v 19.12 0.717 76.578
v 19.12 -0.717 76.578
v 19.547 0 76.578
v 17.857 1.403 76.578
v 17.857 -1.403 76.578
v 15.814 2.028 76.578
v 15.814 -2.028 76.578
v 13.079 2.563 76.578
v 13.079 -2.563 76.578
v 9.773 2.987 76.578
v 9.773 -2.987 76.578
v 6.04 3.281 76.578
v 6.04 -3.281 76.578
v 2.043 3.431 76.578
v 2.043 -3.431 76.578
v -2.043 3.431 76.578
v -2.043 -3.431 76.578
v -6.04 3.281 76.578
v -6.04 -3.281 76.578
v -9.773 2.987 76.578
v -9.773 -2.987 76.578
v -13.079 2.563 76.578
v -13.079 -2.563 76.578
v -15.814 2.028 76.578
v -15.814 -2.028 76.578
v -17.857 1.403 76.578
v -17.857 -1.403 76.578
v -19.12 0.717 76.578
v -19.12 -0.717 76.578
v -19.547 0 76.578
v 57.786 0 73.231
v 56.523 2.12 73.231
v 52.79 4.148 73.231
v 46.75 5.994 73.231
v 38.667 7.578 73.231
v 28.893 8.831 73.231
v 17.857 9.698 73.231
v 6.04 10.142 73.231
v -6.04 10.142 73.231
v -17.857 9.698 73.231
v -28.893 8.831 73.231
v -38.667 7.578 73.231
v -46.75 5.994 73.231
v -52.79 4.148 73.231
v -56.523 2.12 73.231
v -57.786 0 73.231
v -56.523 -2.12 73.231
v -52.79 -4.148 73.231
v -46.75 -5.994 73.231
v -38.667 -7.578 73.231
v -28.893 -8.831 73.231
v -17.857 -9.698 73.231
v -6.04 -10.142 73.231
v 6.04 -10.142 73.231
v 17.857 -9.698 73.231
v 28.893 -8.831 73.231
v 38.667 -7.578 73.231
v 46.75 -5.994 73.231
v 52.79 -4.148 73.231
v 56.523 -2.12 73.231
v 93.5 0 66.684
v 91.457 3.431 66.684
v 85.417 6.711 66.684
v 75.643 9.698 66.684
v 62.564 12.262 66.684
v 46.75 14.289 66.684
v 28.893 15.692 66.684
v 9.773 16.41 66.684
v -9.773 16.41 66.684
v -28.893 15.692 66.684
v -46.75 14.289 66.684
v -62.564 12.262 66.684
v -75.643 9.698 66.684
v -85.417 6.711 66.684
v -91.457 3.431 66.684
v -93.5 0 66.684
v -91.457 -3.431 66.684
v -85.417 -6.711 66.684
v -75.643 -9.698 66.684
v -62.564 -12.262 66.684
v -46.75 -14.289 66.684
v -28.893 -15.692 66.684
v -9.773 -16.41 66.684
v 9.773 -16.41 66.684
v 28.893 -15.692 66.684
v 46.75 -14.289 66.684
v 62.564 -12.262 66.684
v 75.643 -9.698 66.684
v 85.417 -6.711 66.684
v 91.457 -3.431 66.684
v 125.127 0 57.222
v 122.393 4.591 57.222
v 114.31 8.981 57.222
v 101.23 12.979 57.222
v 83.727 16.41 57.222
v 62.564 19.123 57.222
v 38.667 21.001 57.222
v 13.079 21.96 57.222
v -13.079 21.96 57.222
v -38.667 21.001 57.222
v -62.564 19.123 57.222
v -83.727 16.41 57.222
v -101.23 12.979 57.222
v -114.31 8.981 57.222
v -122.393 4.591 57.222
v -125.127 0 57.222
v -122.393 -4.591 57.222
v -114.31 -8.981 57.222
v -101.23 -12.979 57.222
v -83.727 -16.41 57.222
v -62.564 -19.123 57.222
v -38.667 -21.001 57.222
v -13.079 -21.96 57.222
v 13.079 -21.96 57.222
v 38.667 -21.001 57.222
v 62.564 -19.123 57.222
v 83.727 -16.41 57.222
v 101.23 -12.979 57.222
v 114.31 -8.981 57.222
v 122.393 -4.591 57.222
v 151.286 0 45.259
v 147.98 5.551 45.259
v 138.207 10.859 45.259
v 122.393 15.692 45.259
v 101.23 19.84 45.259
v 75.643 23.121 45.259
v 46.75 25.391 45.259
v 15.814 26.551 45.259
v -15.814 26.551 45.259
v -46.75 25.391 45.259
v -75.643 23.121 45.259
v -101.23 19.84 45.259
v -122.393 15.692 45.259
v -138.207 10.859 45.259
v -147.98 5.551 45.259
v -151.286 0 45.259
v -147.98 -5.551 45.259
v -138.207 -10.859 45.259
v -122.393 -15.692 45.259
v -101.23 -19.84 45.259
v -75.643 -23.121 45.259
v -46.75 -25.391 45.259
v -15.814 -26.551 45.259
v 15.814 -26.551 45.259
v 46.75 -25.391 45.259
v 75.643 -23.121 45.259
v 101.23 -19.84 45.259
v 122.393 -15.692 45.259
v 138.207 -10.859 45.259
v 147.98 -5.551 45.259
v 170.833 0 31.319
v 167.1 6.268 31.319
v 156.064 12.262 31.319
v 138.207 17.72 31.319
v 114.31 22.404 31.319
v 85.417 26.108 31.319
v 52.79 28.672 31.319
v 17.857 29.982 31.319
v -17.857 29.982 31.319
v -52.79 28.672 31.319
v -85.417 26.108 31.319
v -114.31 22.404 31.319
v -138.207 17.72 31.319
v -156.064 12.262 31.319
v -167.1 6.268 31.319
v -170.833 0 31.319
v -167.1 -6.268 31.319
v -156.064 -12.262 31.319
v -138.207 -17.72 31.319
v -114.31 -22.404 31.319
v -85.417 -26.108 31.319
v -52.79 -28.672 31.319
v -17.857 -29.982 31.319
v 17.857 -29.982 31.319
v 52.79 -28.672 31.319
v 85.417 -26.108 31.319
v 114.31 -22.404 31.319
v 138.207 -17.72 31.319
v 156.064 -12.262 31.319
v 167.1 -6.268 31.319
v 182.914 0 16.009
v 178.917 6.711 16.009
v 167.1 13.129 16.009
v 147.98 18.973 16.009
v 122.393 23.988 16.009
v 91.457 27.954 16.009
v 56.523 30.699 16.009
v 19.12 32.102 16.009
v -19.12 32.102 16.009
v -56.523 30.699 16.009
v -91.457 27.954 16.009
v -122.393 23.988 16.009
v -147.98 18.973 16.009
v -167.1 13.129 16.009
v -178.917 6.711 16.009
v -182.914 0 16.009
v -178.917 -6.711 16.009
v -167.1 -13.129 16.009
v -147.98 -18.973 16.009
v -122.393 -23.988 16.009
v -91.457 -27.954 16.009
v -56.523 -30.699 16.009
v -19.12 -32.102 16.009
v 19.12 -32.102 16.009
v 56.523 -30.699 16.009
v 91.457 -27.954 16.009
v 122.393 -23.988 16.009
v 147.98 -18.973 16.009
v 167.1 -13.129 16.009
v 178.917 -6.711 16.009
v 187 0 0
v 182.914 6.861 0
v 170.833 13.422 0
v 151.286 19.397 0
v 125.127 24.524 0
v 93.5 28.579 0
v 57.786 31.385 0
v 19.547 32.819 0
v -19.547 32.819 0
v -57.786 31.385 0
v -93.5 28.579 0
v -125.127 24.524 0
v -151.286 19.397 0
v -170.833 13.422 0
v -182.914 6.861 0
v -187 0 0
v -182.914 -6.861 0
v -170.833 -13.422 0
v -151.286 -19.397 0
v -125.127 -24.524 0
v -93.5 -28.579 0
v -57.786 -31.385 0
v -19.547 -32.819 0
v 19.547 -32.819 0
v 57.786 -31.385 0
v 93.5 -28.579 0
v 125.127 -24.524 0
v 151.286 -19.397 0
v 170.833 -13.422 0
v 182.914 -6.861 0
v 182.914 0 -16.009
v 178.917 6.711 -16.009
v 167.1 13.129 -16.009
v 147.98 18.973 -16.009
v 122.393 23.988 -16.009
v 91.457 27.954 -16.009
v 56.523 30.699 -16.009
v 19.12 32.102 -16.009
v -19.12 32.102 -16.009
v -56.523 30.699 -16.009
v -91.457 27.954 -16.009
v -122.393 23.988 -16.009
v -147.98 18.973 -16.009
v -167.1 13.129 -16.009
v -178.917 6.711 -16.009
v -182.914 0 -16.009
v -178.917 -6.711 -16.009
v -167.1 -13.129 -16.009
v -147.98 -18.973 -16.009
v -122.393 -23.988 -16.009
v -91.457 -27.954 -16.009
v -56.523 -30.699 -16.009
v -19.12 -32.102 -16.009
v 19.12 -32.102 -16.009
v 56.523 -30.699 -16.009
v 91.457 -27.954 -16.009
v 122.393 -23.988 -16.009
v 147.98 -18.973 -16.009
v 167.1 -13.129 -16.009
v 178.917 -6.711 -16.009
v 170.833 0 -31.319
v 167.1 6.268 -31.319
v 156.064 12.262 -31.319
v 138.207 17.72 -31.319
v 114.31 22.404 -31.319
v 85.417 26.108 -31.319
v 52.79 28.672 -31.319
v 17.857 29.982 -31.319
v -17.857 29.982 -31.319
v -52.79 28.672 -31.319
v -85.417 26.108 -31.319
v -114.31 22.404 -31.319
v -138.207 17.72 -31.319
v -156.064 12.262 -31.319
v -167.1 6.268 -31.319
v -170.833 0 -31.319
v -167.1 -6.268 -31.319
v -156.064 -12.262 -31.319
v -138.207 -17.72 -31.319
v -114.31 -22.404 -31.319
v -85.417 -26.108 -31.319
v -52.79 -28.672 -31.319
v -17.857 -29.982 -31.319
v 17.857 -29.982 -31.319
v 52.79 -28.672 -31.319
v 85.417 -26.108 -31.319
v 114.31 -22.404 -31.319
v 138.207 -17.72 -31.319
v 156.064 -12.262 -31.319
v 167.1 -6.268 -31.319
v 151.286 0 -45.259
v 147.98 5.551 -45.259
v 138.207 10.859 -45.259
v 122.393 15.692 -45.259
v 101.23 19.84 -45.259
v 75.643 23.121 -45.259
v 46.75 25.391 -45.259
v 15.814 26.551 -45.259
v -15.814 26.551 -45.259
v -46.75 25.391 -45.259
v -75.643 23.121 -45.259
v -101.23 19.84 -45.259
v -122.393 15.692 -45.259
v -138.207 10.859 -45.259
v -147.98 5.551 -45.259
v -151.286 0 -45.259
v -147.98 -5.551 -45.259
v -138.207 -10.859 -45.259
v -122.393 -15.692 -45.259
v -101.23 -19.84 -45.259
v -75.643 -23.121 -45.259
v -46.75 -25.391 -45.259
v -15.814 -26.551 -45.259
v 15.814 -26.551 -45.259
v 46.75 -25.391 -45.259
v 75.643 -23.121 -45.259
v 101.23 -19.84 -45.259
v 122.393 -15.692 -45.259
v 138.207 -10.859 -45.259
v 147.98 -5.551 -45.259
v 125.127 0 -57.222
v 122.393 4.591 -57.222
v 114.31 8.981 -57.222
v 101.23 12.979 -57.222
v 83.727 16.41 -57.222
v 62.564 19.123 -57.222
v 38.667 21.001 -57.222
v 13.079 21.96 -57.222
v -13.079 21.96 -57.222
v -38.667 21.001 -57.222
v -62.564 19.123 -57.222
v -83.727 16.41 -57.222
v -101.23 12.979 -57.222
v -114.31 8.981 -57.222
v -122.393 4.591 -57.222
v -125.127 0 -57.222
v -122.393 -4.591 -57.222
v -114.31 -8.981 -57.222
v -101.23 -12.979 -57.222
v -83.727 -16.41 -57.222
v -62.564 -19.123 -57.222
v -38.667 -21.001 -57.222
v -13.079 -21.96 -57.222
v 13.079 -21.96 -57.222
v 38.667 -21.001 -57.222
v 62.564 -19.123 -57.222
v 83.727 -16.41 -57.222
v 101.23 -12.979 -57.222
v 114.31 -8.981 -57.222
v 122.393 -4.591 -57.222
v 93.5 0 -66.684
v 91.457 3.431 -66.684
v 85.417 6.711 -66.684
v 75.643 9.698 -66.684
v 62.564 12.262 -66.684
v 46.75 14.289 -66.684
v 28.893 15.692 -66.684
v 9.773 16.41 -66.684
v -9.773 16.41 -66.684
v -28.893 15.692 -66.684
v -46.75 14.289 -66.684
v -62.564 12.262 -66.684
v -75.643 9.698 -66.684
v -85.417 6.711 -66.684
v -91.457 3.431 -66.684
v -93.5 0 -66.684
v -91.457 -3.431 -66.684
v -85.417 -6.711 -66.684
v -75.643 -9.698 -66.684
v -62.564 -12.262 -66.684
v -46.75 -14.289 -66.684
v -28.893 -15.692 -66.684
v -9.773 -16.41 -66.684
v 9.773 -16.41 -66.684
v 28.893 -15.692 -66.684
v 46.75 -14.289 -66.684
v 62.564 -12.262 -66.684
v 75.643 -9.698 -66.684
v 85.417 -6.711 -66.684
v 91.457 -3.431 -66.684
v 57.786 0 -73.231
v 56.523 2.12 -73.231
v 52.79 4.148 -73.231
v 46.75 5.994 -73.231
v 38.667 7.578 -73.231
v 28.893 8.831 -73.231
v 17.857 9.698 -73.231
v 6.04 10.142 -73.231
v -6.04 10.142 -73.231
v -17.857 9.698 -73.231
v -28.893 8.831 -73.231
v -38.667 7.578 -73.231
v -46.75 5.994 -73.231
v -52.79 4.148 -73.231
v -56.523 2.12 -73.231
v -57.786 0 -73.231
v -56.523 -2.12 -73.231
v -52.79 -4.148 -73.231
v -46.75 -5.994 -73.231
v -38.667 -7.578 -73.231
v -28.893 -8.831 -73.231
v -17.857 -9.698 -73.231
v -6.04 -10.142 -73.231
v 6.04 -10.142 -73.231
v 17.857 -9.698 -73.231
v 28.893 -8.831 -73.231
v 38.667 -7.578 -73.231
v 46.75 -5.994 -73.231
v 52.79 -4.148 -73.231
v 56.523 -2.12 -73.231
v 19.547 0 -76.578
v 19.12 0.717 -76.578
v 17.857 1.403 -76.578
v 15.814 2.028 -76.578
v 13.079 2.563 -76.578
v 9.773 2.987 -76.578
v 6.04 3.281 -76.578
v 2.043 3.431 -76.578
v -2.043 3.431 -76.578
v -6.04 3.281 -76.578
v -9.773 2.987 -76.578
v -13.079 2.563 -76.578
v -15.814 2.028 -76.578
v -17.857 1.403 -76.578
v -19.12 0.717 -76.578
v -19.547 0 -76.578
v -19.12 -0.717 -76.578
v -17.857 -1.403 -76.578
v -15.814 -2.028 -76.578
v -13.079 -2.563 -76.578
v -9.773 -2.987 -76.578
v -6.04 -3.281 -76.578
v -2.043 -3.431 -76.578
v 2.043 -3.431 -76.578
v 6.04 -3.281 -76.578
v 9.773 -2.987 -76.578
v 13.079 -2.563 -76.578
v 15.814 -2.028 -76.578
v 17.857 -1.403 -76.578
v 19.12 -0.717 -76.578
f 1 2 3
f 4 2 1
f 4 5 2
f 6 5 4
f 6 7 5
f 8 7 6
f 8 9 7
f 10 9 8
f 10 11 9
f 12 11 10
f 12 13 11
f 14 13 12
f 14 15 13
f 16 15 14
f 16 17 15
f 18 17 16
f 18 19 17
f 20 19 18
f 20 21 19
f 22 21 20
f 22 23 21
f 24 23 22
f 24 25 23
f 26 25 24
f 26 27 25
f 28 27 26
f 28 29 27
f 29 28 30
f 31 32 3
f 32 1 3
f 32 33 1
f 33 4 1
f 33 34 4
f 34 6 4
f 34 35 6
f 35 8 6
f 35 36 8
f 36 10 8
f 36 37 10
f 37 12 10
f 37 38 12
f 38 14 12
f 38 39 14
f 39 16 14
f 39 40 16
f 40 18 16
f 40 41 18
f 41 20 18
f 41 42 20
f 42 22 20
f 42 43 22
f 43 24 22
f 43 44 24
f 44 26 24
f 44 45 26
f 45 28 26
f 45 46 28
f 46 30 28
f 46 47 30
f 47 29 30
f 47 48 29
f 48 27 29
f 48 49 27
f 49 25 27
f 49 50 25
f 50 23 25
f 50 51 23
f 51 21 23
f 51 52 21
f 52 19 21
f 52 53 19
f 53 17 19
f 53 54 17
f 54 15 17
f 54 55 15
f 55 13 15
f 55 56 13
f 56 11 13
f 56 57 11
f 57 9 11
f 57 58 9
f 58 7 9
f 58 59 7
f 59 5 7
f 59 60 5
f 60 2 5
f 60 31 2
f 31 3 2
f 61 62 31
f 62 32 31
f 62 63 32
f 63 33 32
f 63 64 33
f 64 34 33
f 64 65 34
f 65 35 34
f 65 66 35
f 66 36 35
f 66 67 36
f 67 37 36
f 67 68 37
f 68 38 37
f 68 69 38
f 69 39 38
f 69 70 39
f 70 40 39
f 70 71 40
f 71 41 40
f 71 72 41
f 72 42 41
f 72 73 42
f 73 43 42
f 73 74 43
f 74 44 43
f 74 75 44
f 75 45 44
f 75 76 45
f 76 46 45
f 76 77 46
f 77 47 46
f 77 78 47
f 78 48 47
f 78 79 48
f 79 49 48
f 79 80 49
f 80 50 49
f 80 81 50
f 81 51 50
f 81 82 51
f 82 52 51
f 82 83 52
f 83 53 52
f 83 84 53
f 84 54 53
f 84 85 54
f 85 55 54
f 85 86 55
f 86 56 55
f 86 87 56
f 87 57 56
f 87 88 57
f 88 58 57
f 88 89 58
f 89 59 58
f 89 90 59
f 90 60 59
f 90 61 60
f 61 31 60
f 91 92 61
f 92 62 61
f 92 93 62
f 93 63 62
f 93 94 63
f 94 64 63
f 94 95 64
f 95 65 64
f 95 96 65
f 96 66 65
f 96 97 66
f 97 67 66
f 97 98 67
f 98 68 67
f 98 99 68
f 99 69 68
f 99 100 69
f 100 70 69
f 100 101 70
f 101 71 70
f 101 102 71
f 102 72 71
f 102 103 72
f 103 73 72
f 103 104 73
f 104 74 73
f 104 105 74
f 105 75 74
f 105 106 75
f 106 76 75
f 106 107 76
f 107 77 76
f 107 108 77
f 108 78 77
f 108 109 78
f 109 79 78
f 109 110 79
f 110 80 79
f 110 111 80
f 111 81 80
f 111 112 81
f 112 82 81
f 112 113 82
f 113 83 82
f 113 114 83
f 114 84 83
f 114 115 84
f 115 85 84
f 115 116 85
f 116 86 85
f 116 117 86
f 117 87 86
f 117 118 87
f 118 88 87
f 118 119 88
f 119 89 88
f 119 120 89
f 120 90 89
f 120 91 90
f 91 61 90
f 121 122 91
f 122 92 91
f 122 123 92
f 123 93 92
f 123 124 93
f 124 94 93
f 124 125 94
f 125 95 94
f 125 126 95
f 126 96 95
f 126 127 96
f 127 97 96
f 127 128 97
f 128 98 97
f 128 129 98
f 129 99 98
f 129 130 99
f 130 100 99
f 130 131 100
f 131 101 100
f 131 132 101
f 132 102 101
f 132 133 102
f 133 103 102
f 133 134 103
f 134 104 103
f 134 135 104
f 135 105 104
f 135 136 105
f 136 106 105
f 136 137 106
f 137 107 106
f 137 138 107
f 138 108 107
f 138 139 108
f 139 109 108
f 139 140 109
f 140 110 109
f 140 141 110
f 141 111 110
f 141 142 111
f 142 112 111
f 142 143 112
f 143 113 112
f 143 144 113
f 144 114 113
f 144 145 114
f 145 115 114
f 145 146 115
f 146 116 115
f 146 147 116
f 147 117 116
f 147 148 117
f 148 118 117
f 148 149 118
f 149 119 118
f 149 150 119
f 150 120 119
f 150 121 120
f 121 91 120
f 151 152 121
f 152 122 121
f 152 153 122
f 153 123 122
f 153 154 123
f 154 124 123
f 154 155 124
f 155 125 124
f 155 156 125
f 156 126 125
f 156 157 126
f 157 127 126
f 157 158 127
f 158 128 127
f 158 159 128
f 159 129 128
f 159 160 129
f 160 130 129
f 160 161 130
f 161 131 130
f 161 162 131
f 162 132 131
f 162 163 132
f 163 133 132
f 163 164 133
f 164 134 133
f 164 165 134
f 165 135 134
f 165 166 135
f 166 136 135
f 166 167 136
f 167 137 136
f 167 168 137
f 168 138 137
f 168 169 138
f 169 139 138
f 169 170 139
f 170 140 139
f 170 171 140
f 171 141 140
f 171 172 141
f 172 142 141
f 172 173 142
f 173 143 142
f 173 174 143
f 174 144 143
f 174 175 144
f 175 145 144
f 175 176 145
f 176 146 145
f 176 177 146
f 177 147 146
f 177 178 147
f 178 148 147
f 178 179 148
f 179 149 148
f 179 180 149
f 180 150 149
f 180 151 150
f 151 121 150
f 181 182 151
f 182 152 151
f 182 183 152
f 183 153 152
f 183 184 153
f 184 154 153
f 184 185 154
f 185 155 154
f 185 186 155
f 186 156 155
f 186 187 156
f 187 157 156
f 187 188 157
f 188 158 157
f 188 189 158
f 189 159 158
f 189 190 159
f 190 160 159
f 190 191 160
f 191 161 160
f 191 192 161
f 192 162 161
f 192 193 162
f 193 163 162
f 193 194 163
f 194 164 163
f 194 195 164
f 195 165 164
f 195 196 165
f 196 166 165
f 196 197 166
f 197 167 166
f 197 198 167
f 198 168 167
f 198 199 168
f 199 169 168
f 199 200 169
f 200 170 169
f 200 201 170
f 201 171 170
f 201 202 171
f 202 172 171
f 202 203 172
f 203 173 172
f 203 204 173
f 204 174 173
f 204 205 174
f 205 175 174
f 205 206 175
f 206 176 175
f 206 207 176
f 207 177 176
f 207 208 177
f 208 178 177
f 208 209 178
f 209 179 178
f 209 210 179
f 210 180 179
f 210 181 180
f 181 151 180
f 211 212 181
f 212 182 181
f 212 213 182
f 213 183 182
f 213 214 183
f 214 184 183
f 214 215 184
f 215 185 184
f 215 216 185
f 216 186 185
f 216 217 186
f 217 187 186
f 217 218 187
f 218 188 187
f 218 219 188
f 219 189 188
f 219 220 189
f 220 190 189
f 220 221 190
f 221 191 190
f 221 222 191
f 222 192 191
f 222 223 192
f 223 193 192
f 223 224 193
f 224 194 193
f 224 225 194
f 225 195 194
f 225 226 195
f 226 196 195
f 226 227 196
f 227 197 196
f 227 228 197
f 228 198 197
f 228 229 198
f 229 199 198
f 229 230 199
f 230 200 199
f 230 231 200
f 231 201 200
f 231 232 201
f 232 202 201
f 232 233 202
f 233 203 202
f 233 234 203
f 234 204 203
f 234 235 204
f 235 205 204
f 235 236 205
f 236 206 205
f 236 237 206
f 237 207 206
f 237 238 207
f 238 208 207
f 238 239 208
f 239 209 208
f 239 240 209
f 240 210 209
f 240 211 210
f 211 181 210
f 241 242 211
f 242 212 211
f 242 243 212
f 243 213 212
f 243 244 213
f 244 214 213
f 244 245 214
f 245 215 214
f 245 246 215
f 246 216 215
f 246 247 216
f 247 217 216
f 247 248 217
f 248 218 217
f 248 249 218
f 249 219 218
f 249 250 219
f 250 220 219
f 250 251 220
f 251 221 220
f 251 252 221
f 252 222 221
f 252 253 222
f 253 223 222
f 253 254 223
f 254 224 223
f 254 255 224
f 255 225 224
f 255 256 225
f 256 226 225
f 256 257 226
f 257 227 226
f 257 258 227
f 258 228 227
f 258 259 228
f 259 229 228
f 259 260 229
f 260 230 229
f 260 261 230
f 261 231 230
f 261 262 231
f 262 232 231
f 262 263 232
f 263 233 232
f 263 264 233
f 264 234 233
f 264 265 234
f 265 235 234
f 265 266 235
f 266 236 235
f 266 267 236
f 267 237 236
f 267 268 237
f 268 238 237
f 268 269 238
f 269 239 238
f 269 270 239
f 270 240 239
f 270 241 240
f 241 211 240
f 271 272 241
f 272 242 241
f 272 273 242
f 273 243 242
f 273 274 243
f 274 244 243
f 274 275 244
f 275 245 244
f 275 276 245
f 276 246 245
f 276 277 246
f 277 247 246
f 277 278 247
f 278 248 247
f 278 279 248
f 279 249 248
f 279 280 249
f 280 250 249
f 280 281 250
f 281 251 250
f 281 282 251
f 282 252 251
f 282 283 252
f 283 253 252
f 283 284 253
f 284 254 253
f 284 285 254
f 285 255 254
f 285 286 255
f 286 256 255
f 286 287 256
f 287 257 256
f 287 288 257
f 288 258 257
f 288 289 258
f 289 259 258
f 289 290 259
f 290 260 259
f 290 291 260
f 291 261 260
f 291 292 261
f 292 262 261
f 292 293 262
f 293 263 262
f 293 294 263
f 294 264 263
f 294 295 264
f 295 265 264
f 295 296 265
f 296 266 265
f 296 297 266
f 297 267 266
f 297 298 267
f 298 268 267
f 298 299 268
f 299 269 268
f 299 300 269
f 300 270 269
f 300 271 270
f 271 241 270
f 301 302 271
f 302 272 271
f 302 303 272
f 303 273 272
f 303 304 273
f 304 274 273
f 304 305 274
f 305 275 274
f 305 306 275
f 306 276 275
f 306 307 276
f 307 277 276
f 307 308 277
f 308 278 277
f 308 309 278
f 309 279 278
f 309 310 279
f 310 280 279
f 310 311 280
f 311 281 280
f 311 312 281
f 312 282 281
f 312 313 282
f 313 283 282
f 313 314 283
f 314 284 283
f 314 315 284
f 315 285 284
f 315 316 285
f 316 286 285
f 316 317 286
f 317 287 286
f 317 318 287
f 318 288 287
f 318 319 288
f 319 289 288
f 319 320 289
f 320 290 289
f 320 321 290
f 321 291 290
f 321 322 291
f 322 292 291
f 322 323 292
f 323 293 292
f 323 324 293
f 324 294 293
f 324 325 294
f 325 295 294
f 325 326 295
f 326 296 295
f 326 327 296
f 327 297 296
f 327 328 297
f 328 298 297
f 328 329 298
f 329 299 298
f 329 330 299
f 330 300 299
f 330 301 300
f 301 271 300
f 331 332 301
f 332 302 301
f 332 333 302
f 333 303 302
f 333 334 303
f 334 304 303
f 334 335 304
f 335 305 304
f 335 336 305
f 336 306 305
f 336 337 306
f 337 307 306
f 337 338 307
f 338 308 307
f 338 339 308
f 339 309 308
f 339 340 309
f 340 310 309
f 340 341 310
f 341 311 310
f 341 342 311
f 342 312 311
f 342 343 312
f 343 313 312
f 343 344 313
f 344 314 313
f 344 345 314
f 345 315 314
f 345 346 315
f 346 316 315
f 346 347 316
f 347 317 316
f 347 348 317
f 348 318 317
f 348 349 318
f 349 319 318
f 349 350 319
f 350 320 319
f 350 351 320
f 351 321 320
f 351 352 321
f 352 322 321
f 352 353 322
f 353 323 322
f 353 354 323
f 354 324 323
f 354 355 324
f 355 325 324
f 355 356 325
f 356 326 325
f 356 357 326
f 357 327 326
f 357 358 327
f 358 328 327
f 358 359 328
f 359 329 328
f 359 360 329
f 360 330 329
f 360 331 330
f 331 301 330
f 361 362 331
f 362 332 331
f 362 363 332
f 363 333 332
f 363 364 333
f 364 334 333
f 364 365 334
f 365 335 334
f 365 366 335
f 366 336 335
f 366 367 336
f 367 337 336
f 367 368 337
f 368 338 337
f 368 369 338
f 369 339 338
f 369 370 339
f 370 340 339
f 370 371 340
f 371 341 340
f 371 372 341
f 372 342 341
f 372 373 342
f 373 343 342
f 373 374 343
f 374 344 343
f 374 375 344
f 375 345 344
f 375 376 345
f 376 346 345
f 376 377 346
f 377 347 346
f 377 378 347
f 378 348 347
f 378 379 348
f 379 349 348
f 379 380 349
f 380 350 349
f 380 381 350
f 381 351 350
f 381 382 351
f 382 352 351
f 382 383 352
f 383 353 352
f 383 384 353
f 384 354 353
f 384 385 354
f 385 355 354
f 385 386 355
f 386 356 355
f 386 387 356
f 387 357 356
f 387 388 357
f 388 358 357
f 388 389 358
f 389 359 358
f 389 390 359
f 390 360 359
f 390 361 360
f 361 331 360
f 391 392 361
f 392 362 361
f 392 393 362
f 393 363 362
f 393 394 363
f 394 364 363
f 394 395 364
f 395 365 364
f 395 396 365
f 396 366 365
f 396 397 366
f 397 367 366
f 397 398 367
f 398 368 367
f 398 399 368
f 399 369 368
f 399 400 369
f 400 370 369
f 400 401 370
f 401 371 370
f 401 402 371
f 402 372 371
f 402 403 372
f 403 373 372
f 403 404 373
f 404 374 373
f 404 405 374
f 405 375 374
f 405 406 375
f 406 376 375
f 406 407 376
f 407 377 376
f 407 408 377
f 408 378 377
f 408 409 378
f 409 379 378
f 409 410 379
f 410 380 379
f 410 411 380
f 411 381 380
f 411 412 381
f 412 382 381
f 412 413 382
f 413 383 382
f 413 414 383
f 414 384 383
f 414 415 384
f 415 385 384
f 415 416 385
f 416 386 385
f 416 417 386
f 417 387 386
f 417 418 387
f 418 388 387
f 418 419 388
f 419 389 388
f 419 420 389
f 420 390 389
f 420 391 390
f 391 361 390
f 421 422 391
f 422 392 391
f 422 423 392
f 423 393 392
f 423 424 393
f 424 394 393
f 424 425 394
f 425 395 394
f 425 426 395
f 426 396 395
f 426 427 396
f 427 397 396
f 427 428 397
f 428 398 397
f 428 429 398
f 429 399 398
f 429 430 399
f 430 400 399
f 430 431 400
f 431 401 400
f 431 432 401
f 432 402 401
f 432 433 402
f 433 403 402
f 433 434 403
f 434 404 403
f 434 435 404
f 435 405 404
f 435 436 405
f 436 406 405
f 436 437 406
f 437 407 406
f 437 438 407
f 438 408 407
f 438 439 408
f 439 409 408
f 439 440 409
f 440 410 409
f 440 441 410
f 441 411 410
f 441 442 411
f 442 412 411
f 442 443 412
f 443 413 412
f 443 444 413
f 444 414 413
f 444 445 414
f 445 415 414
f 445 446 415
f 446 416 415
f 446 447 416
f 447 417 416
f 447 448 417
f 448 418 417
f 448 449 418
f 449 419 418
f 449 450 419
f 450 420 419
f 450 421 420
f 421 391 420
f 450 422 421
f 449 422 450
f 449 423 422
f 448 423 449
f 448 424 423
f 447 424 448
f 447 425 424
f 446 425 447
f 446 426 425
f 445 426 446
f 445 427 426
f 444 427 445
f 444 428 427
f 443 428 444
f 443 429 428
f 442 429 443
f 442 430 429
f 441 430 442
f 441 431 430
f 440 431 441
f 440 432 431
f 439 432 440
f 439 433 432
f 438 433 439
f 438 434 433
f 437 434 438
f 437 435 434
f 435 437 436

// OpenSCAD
// Generated by SolidPython 1.0.1 on 2020-07-29 00:46:52


scale(v = [17, 3, 7]) {
	sphere(r = 11);
}
/***********************************************
*********      SolidPython code:      **********
************************************************
 
# import packages: SolidPython
from solid import *
from solid.utils import *
from itertools import chain, combinations, permutations


class Resize:

    def __init__(self, scad_file):
        self.scad_file = scad_file
        #self.scad_file = import_scad(scad_file)
        # cone/cylinder param:
        self.r1 = 0
        self.r2 = 0
        self.h = 0
        # rectangular prism param:
        self.w = 0
        self.l = 0
        # ellipse param:
        self.r = 0

    # import OpenScad code (file name corresponds to shape)


    # classify shape + parameters
    def assign(self, param1, param2, param3):
        if self.scad_file == 'cone.scad':
            self.r1 = param1
            self.r2 = param2
            self.h = param3
        elif self.scad_file == 'cylinder.scad':
            self.r1 = param1
            self.r2 = param2
            self.h = param3
        elif self.scad_file == 'rectangularPrism.scad':
            self.h = param1
            self.l = param2
            self.w = param3
        else:
            self.r = param1
            self.h = param2

    # resize parameters
    def iterate(self):
        x = range(3, 20, 2)
        i = 1
        if self.scad_file == 'cone.scad':
            tempList = list(permutations(x, 2))
            for temp in tempList:
                param1 = temp[0]
                param2 = temp[1]
                filepath = 'produced_scad_files/' + 'cone' + str(param1) + '_' + str(param2) + '_' + '.scad'
                scad_render_to_file(cylinder(h=param1, r1=param2, r2=0), filepath)

        elif self.scad_file == 'cylinder.scad':
            tempList = list(permutations(x, 3))
            for temp in tempList:
                param1 = temp[0]
                param2 = temp[1]
                filepath = 'produced_scad_files/' + 'cylinder' + str(param1) + '_' + str(param2) + '_' + '.scad'
                scad_render_to_file(cylinder(h=param1, r1=param2, r2=param2), filepath)

        elif self.scad_file == 'rectangularPrism.scad':
            tempList = list(permutations(x, 3))
            for temp in tempList:
                param1 = temp[0]
                param2 = temp[1]
                param3 = temp[2]
                filepath = 'produced_scad_files/' + 'rectangularPrism' + str(param1) + '_' + str(param2) + '_' + str(
                    param3) + '.scad'
                scad_render_to_file(cube(size=(param1, param2, param3)), filepath)

        elif self.scad_file == 'ellipse.scad':
            tempList = list(permutations(x, 4))
            for temp in tempList:
                param1 = temp[0]
                param2 = temp[1]
                param3 = temp[2]
                param4 = temp[3]
                filepath = 'produced_scad_files/' + 'ellipse' + str(param1) + '_' + str(param2) + '_' + str(param3) + '_' + str(param4) + '.scad'
                scad_render_to_file(scale([param1, param2, param3])(sphere(r=param4)), filepath)

    def render_to_scadfile(self):
        scad_render_to_file(scad, 'example.scad') 
 
************************************************/
